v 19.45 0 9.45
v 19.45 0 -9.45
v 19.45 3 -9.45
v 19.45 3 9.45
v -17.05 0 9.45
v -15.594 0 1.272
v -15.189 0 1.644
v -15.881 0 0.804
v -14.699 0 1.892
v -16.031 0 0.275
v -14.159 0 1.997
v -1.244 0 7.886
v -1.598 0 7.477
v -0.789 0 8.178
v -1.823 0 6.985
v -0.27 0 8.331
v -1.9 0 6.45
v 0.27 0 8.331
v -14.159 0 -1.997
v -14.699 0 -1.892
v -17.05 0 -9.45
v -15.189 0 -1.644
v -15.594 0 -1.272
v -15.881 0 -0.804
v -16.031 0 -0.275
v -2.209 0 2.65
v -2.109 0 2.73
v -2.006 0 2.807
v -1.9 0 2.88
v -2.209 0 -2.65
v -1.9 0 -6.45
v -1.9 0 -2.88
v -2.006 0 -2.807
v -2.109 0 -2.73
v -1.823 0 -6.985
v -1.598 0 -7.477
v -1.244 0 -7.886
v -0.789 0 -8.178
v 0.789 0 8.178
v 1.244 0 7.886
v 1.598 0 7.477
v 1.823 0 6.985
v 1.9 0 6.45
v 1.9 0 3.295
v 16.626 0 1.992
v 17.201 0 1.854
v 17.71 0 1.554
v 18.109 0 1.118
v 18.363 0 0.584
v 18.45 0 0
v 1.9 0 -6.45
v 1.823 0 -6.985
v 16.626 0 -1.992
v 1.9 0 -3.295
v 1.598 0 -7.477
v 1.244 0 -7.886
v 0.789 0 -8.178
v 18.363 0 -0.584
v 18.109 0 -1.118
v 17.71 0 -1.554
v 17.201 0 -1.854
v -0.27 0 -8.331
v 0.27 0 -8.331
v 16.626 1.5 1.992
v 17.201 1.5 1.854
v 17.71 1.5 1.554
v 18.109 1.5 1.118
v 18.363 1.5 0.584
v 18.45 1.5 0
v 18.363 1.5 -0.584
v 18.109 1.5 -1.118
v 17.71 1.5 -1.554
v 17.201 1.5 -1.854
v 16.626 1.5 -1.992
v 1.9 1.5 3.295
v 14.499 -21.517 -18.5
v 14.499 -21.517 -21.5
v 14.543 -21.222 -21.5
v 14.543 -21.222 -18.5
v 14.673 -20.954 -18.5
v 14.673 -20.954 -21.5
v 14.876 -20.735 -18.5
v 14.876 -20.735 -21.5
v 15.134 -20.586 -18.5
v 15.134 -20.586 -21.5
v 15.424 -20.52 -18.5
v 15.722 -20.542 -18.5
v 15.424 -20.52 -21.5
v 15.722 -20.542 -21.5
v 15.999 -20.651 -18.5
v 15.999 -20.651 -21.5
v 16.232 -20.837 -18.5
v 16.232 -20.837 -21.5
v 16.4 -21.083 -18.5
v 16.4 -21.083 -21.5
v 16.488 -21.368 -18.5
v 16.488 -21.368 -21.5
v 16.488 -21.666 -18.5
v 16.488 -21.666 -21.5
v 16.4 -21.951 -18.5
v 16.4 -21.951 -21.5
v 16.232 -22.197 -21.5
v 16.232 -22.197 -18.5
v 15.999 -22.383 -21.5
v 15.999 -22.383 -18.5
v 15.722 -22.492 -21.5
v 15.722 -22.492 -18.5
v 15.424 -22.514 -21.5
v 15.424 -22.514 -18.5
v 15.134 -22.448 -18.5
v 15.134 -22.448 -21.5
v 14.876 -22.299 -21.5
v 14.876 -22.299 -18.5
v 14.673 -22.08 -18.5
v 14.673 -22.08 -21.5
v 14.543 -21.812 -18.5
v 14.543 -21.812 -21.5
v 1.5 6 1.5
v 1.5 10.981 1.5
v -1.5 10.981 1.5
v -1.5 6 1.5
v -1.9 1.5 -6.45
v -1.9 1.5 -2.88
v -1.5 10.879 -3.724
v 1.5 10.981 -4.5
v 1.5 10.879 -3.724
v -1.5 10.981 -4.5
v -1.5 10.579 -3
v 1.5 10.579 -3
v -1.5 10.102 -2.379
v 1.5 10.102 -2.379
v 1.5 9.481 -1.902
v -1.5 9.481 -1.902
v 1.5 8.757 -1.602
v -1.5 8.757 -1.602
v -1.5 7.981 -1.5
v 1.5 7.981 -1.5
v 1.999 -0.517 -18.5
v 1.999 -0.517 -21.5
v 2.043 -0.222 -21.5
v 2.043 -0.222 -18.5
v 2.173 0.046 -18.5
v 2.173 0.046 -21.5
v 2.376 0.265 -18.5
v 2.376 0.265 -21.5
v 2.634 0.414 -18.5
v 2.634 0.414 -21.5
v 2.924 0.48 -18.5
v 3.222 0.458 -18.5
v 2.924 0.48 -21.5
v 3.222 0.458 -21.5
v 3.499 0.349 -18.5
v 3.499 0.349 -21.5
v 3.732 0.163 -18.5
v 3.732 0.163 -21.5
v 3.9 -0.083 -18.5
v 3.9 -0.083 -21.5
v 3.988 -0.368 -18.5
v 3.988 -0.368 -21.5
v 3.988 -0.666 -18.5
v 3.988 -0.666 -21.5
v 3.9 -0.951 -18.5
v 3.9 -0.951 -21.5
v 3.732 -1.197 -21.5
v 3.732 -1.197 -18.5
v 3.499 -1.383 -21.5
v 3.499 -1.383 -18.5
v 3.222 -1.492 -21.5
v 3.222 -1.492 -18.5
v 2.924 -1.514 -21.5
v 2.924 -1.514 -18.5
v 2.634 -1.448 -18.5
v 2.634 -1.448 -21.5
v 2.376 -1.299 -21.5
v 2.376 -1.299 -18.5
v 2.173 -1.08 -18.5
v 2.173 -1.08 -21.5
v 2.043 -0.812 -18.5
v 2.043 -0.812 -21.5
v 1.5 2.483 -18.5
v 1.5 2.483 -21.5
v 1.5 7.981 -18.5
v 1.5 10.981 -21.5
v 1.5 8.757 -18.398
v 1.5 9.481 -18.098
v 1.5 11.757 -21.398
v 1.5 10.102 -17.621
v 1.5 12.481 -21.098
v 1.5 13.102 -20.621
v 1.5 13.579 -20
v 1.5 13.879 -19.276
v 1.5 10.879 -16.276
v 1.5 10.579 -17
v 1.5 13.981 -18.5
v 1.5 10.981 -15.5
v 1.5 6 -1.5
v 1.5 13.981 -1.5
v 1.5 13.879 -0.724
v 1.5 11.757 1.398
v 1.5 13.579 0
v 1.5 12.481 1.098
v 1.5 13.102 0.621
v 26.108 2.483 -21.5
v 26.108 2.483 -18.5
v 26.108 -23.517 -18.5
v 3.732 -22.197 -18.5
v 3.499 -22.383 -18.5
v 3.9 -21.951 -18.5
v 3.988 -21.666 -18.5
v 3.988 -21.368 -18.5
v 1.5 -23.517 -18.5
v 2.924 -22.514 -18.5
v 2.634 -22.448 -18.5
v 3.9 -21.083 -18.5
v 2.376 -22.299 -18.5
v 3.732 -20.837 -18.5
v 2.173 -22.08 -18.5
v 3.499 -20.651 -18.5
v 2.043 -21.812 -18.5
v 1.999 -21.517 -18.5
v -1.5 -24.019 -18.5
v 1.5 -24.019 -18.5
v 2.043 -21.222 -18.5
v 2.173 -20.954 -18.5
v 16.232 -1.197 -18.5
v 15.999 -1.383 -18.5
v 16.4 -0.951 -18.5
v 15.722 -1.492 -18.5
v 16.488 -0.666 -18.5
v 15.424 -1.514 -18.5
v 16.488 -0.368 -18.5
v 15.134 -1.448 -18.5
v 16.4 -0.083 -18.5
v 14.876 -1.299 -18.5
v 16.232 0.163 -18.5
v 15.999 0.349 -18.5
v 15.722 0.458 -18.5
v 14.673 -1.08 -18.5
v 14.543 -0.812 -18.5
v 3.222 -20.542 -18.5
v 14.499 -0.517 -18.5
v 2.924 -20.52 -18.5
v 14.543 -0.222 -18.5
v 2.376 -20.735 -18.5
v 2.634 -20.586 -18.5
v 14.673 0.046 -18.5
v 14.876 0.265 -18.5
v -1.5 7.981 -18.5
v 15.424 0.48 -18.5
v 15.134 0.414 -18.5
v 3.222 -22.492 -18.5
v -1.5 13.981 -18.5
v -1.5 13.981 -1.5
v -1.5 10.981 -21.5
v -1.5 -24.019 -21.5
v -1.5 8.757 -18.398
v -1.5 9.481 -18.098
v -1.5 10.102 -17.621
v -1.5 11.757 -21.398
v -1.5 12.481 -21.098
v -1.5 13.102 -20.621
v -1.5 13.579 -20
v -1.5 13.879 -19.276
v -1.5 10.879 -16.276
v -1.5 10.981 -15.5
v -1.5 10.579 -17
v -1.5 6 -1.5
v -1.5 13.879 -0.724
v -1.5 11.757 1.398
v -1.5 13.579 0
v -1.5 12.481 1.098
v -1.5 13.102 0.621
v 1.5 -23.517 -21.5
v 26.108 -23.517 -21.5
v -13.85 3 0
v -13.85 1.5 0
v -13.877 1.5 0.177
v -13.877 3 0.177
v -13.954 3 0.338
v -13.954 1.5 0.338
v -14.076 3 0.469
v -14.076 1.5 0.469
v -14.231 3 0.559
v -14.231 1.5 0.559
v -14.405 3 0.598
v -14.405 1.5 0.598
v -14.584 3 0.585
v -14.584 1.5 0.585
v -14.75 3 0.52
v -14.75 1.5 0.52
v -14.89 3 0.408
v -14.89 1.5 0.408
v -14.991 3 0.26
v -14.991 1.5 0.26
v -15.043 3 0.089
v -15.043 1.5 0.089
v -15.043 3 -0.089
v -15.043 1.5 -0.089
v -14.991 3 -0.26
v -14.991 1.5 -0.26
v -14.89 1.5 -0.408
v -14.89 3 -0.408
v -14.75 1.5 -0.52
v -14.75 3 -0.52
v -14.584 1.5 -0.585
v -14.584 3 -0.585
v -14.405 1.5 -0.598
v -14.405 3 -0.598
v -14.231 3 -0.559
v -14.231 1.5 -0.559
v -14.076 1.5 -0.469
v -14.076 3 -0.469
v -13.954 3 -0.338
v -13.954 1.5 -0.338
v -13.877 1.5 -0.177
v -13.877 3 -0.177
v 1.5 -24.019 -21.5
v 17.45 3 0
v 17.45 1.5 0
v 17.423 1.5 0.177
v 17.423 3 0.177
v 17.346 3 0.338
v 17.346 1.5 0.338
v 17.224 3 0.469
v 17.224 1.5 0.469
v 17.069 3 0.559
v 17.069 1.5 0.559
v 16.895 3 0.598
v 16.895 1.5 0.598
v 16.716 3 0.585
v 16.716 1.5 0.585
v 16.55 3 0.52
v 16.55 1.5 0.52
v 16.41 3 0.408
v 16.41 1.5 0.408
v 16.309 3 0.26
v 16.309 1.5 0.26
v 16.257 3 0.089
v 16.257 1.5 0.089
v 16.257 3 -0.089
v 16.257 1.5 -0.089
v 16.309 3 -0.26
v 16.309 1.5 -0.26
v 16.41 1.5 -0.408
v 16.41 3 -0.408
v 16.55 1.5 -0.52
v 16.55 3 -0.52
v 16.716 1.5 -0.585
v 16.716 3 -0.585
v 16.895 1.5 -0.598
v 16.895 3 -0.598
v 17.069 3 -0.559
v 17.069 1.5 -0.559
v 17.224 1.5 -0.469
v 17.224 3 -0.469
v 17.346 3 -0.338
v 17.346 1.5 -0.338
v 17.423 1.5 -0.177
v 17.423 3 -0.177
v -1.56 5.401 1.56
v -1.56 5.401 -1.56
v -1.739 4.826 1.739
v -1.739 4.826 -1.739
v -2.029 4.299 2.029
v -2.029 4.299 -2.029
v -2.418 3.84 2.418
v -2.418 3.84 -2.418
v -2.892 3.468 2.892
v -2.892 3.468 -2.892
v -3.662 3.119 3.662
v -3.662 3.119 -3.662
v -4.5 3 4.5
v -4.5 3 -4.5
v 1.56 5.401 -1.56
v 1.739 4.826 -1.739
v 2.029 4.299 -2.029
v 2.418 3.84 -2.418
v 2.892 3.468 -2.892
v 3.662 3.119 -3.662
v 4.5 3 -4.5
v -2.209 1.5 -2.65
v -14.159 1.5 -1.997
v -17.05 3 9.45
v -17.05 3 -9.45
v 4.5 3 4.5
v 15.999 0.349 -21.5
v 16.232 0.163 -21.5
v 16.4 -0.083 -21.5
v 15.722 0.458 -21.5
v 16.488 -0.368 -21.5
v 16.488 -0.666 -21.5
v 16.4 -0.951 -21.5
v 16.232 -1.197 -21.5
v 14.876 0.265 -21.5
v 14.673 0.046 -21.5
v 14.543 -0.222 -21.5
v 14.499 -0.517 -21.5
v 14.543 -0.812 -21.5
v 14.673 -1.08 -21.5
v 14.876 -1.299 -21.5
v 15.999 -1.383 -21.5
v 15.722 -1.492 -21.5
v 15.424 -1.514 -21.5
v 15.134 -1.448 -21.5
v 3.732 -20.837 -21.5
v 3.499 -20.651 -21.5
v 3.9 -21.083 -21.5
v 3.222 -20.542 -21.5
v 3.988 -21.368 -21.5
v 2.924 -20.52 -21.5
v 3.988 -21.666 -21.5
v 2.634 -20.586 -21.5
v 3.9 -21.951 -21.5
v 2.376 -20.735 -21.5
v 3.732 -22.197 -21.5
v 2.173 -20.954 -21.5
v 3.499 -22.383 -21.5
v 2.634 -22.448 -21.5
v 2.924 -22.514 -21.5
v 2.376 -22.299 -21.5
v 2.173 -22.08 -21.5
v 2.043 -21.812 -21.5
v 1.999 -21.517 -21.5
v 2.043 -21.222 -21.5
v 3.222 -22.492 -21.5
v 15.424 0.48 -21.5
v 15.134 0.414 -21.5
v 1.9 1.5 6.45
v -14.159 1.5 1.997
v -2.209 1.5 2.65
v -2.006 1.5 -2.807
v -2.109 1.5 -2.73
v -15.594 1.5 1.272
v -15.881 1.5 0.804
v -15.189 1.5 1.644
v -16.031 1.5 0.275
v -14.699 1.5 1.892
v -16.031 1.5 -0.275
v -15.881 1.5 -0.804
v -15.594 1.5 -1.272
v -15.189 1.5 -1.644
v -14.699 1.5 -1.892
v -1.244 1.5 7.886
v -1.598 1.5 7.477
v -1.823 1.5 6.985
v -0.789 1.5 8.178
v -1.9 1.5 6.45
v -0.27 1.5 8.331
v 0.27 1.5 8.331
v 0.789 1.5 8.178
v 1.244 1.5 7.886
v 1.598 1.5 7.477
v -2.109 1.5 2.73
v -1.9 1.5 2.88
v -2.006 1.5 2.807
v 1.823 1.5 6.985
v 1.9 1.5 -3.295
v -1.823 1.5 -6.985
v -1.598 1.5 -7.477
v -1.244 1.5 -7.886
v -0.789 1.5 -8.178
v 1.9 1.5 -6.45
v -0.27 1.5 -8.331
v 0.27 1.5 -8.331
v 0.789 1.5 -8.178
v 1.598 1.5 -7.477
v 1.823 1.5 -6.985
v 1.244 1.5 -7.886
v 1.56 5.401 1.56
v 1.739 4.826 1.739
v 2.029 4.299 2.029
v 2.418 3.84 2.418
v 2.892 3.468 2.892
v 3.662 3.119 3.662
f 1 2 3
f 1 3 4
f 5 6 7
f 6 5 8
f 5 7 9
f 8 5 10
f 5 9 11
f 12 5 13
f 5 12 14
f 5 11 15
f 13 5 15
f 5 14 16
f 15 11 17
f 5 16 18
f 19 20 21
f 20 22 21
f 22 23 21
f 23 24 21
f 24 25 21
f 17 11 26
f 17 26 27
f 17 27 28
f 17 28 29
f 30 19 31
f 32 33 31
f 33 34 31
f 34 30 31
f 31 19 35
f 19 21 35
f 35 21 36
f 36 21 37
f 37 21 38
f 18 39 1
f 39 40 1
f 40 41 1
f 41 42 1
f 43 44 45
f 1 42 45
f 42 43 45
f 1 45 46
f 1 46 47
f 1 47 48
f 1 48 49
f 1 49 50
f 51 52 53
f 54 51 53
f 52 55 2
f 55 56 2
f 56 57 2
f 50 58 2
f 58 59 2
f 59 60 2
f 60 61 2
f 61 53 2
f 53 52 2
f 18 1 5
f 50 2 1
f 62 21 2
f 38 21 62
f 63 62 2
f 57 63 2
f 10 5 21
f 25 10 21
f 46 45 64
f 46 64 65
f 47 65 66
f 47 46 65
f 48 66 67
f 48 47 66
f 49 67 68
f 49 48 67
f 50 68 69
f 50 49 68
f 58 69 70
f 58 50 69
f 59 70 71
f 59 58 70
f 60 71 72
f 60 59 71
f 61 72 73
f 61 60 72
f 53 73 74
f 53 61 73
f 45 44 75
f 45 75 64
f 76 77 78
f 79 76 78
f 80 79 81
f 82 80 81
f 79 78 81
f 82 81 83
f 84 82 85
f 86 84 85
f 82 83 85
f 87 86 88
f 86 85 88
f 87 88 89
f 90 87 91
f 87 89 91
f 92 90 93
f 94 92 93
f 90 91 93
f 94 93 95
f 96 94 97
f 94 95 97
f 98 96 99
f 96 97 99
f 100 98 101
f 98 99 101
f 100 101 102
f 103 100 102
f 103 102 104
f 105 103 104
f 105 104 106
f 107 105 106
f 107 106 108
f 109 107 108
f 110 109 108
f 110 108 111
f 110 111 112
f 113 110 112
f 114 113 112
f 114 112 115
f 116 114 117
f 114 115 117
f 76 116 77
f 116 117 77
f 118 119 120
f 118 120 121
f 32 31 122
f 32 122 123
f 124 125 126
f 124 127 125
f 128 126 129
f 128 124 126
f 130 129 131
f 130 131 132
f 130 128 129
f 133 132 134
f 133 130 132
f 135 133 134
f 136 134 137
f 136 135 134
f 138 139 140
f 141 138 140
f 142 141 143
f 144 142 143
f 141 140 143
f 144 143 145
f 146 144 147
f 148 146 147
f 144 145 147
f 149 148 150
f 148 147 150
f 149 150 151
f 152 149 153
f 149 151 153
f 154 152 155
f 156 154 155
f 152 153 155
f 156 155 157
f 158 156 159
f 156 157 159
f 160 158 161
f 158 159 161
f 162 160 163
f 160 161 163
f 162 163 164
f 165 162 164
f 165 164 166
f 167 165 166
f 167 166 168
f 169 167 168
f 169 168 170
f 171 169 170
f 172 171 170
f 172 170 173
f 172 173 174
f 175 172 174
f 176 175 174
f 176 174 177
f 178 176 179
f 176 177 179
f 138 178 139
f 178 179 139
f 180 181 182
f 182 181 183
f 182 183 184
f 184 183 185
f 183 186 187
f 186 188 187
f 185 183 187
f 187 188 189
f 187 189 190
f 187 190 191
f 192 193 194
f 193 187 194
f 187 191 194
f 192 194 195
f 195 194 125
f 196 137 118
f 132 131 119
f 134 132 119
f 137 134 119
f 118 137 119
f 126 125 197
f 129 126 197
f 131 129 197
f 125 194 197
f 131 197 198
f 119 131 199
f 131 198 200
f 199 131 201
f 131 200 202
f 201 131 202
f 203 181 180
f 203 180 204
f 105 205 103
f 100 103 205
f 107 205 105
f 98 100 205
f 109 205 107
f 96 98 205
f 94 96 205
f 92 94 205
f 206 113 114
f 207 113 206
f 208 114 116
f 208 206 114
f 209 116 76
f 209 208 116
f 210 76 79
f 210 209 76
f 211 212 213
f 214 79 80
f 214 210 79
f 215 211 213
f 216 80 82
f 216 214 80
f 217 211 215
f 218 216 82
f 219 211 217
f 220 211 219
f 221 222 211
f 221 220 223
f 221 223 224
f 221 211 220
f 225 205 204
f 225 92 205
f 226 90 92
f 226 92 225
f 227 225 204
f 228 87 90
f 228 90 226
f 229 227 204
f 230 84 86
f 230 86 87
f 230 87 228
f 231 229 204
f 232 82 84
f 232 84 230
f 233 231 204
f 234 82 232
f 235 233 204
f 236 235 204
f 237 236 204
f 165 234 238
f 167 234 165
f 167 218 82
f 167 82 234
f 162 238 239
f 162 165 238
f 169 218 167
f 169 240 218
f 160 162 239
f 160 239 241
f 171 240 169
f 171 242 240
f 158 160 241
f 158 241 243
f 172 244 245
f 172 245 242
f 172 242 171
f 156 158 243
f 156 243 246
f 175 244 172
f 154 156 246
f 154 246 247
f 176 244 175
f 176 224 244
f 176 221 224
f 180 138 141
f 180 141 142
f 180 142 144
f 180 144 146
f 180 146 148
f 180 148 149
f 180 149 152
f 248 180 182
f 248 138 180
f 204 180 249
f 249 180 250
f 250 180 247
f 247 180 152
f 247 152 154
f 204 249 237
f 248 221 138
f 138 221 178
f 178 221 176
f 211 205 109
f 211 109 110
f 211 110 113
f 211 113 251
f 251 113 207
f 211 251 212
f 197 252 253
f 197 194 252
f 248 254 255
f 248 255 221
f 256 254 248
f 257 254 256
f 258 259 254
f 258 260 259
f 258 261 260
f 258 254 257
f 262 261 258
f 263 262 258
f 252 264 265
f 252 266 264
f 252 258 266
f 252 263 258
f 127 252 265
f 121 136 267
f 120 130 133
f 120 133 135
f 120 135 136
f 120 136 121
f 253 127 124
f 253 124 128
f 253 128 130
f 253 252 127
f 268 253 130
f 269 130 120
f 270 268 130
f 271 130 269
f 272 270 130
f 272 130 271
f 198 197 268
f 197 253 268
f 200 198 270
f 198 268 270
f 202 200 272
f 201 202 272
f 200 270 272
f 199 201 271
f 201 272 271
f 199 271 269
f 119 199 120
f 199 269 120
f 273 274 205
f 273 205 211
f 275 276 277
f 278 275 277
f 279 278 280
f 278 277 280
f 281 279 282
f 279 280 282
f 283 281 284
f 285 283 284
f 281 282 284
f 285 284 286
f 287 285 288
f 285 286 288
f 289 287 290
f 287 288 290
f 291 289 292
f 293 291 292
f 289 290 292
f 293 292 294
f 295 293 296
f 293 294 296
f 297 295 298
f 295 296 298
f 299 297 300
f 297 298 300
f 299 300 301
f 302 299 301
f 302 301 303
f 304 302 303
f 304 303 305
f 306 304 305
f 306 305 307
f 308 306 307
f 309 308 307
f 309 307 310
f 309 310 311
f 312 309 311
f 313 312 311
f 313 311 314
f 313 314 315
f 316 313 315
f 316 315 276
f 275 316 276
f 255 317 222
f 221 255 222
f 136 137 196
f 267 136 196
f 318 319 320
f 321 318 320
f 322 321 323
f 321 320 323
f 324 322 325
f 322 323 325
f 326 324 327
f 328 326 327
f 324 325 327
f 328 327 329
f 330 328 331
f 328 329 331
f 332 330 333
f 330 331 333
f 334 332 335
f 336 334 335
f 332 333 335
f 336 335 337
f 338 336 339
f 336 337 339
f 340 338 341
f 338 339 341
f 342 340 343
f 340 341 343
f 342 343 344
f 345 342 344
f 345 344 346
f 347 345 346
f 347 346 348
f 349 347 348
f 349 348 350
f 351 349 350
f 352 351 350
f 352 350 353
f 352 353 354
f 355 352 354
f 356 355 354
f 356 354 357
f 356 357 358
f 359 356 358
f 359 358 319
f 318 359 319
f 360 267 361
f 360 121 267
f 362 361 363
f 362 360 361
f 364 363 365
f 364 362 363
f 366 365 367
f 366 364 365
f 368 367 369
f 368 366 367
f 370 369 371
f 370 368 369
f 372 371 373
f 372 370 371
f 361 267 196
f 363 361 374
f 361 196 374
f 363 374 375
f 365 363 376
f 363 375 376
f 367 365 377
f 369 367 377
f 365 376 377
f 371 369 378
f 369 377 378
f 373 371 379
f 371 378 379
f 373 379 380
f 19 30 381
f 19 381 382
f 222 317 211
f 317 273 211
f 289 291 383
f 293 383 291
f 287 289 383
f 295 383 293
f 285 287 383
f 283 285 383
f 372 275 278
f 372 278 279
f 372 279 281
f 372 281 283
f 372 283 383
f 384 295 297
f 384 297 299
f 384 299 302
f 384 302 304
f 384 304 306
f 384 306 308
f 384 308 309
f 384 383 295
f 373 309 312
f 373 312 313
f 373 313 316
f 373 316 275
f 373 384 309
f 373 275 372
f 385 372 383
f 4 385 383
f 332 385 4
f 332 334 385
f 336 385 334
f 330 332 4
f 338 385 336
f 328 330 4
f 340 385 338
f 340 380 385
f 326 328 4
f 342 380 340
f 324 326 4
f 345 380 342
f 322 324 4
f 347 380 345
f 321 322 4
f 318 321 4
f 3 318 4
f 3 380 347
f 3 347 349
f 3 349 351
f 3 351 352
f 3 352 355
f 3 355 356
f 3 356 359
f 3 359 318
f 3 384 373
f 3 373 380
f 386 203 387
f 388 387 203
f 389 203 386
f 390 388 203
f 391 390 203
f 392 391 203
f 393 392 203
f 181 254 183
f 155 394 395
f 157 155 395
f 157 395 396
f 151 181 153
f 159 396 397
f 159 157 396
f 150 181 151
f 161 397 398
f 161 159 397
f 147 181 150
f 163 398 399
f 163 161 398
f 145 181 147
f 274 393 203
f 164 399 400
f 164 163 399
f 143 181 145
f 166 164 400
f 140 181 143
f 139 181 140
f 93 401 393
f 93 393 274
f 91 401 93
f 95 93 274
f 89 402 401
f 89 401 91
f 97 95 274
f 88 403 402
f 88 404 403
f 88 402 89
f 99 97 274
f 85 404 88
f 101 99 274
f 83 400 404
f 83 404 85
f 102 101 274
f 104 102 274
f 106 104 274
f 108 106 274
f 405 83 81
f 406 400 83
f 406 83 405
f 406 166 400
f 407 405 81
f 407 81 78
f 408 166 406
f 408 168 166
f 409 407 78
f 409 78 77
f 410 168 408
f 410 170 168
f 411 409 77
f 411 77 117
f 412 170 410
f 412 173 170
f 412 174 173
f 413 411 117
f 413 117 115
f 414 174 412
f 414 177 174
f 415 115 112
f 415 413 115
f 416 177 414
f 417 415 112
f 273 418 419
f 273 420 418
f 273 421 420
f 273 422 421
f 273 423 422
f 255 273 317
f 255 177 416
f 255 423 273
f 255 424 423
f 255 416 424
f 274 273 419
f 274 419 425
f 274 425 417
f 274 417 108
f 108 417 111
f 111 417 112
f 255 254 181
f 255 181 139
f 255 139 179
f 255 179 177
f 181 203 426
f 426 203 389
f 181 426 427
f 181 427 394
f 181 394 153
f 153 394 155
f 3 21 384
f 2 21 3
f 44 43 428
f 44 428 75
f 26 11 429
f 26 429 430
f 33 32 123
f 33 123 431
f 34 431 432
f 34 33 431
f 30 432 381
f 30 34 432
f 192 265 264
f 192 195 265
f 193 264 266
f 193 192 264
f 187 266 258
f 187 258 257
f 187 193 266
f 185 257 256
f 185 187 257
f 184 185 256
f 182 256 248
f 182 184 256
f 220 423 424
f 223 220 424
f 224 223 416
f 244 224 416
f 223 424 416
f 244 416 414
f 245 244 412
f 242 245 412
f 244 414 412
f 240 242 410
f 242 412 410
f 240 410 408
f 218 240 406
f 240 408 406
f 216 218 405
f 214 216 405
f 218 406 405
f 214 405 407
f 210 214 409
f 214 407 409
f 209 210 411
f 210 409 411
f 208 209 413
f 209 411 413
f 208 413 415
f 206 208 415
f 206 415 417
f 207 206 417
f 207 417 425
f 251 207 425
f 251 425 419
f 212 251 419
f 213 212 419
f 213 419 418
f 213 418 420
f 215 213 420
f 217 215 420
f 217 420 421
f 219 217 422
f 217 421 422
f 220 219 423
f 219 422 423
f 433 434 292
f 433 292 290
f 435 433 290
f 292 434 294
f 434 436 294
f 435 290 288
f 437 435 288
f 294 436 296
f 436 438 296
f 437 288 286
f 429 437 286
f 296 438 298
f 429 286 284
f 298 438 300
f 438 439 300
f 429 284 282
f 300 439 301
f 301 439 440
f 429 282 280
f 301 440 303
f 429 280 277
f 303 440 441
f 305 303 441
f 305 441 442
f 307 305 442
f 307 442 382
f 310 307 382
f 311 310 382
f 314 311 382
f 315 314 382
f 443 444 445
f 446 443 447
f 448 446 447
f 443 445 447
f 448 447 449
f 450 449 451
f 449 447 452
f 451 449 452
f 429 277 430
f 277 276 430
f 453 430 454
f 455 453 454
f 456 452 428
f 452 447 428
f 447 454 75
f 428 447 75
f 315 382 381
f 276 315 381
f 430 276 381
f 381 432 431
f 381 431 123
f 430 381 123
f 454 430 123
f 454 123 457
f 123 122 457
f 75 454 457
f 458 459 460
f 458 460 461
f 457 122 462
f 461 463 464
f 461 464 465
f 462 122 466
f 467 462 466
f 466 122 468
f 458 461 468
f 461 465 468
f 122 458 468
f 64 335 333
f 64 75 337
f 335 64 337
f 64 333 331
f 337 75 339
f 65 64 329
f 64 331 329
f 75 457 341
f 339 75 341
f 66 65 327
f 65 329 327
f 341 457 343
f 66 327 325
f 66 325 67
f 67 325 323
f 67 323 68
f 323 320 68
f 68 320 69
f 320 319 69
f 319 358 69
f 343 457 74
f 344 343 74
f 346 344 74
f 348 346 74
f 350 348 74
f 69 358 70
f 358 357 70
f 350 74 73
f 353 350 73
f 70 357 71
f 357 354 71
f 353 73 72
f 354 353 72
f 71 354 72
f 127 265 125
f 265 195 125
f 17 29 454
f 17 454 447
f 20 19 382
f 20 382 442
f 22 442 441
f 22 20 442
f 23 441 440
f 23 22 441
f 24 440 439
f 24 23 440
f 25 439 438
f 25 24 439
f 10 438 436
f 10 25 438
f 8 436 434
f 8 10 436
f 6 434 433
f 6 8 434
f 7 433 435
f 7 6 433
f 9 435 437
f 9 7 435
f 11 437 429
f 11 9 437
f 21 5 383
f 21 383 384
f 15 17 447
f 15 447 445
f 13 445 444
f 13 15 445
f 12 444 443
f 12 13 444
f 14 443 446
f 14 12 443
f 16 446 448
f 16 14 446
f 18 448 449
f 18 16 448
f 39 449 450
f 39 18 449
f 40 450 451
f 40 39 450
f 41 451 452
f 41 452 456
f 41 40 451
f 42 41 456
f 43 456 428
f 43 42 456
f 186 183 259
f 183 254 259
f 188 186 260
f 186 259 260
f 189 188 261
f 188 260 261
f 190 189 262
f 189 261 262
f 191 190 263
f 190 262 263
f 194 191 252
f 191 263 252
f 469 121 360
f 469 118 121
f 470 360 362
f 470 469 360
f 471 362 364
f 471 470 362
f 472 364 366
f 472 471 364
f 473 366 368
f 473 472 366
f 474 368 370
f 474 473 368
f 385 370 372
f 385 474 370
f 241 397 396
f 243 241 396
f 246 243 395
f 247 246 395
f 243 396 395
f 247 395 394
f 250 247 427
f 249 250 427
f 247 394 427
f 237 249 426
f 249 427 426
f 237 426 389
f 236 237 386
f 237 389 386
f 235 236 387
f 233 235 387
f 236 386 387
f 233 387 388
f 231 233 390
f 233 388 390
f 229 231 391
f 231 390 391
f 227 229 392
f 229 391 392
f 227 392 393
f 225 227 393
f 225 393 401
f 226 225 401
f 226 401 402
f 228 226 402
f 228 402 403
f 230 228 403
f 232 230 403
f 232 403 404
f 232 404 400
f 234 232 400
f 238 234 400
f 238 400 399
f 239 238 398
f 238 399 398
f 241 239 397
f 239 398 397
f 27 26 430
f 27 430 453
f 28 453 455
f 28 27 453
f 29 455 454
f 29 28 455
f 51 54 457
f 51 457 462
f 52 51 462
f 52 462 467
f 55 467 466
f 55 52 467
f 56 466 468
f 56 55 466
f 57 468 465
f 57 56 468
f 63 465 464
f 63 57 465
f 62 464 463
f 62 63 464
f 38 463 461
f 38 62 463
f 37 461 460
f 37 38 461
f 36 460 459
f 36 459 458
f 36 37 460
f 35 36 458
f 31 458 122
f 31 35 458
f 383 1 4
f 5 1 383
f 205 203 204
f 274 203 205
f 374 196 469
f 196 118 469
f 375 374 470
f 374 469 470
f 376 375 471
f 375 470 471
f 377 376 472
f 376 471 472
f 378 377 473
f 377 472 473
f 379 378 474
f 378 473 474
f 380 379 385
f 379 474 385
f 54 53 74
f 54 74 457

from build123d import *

# Parameters (mm, degrees)
IZIM1_W                                 = 40.658634346
IZIM1_H                                 = 22.072921898
Y_KSEKLIK_EKSTR_ZYON3_DEPTH             = 1.5
IZIM10_W                                = 40.658634346
IZIM10_H                                = 22.072921898
Y_KSEKLIK_EKSTR_ZYON5_DEPTH             = 1.5
Y_KSEKLIK_EKSTR_ZYON6_DEPTH             = 1.5
IZIM12_W                                = 40.658634346
IZIM12_H                                = 22.072921898
KES_EKSTR_ZYON1_DEPTH                   = 5
KES_EKSTR_ZYON1_DEPTH_BACK              = 3
RADYUS1_R                               = 3
Y_KSEKLIK_EKSTR_ZYON7_REACH             = 3.5
Y_KSEKLIK_EKSTR_ZYON7_DIRECTION_2_REACH = 31.45
IZIM18_R                                = 0.6
KES_EKSTR_ZYON3_DEPTH                   = 7
KES_EKSTR_ZYON3_DEPTH_BACK              = 3
SKETCH1_R                               = 1
CUT_EXTRUDE1_DEPTH                      = 3


with BuildPart() as part:
    # Çizim1 → Yükseklik-Ekstrüzyon3 (new body)
    with BuildSketch(Plane(origin=(0, 0, 0), x_dir=(1, 0, 0), z_dir=(0, 1, 0))):
        with Locations((1.2, 0)):
            Rectangle(IZIM1_W, IZIM1_H)
        with BuildLine():
            Line((1.9, -6.45), (1.9, -3.295349698))
            Line((1.9, -3.295349698), (16.626291793, -1.99221515))
            ThreePointArc((16.626291793, -1.99221515), (18.45, 0), (16.626291793, 1.99221515))
            Line((16.626291793, 1.99221515), (1.9, 3.295349698))
            Line((1.9, 3.295349698), (1.9, 6.45))
            ThreePointArc((1.9, 6.45), (0, 8.35), (-1.9, 6.45))
            Line((-1.9, 6.45), (-1.9, 2.87967012))
            ThreePointArc((-1.9, 2.87967012), (-2.057742862, 2.769150468), (-2.209072203, 2.65))
            Line((-2.209072203, 2.65), (-14.159121967, 1.99702088))
            ThreePointArc((-14.159121967, 1.99702088), (-16.05, 0), (-14.159121967, -1.99702088))
            Line((-14.159121967, -1.99702088), (-2.209072203, -2.65))
            ThreePointArc((-2.209072203, -2.65), (-2.057742862, -2.769150468), (-1.9, -2.87967012))
            Line((-1.9, -2.87967012), (-1.9, -6.45))
            ThreePointArc((-1.9, -6.45), (0, -8.35), (1.9, -6.45))
        make_face(mode=Mode.SUBTRACT)
    extrude(amount=Y_KSEKLIK_EKSTR_ZYON3_DEPTH)

    # Çizim10 → Yükseklik-Ekstrüzyon5 (add)
    with BuildSketch(Plane(origin=(0, 1.5, 0), x_dir=(1, 0, 0), z_dir=(0, 1, 0))):
        with Locations((1.2, 0)):
            Rectangle(IZIM10_W, IZIM10_H)
    extrude(amount=Y_KSEKLIK_EKSTR_ZYON5_DEPTH)

    # Çizim11 → Yükseklik-Ekstrüzyon6 (add, symmetric)
    with BuildSketch(Plane(origin=(0, 0, 0), x_dir=(0, 0, -1), z_dir=(1, 0, 0))):
        Polygon((18.5, 10.980931434), (1.5, 10.980931434), (1.5, 1.777726909), (-1.5, 1.777726909), (-1.5, 10.980931434), (-1.5, 13.980931434), (1.5, 13.980931434), (21.5, 13.980931434), (21.5, -24.019068566), (18.5, -24.019068566), align=None)
    extrude(amount=Y_KSEKLIK_EKSTR_ZYON6_DEPTH, both=True)

    # Çizim12 → Kes-Ekstrüzyon1 (cut, two sides)
    with BuildSketch(Plane(origin=(0, 0, 0), x_dir=(1, 0, 0), z_dir=(0, 1, 0))) as kes_ekstr_zyon1_sk:
        with Locations((1.2, 0)):
            Rectangle(IZIM12_W, IZIM12_H)
        Polygon((0, -9.45), (-17.05, -9.45), (-17.05, 9.45), (19.45, 9.45), (19.45, -9.45), align=None, mode=Mode.SUBTRACT)
    extrude(amount=KES_EKSTR_ZYON1_DEPTH, mode=Mode.SUBTRACT)
    extrude(kes_ekstr_zyon1_sk.sketch, amount=-KES_EKSTR_ZYON1_DEPTH_BACK, mode=Mode.SUBTRACT)

    # Radyus1
    radyus1_edges = [part.edges().sort_by_distance(p)[0] for p in [
        (-1.5, 3, 0),
        (0, 3, -1.5),
        (0, 3, 1.5),
        (1.5, 3, 0),
        (0, 13.980931434, -21.5),
        (0, 13.980931434, 1.5),
        (0, 10.980931434, -1.5),
        (0, 10.980931434, -18.5),
    ]]
    fillet(radyus1_edges, radius=RADYUS1_R)

    # Yükseklik-Ekstrüzyon7: up to this face of the body (flat: up to its plane)
    y_kseklik_ekstr_zyon7_end = Plane(part.part.faces().sort_by_distance((0, -6.519068566, -21.5))[0])
    # Çizim13 → Yükseklik-Ekstrüzyon7 (add, up to the picked face)
    with BuildSketch(Plane(origin=(0, 0, -20), x_dir=(-1, 0, 0), z_dir=(0, 0, -1)), mode=Mode.PRIVATE) as y_kseklik_ekstr_zyon7_sk1:
        Polygon((-26.108304445, 2.483027661), (-26.108304445, -23.516972339), (0.891695555, -23.516972339), (0.891695555, -2.497903773), (0.891695555, 2.483027661), align=None)
    y_kseklik_ekstr_zyon7_tool1 = split(extrude(y_kseklik_ekstr_zyon7_sk1.sketch, amount=Y_KSEKLIK_EKSTR_ZYON7_REACH, mode=Mode.PRIVATE), bisect_by=y_kseklik_ekstr_zyon7_end, keep=Keep.BOTH, mode=Mode.PRIVATE)
    add(y_kseklik_ekstr_zyon7_tool1.solids().sort_by_distance((12.608304, -10.516972, -20))[0])

    # Yükseklik-Ekstrüzyon7 direction 2: up to this face of the body (flat: up to its plane)
    y_kseklik_ekstr_zyon7_direction_2_end = Plane(part.part.faces().sort_by_distance((0, -8.019068566, -18.5))[0])
    # Çizim13 → Yükseklik-Ekstrüzyon7 direction 2 (add, up to the picked face)
    with BuildSketch(Plane(origin=(0, 0, -20), x_dir=(-1, 0, 0), z_dir=(0, 0, -1)), mode=Mode.PRIVATE) as y_kseklik_ekstr_zyon7_direction_2_sk1:
        Polygon((-26.108304445, 2.483027661), (-26.108304445, -23.516972339), (0.891695555, -23.516972339), (0.891695555, -2.497903773), (0.891695555, 2.483027661), align=None)
    y_kseklik_ekstr_zyon7_direction_2_tool1 = split(extrude(y_kseklik_ekstr_zyon7_direction_2_sk1.sketch, amount=-Y_KSEKLIK_EKSTR_ZYON7_DIRECTION_2_REACH, mode=Mode.PRIVATE), bisect_by=y_kseklik_ekstr_zyon7_direction_2_end, keep=Keep.BOTH, mode=Mode.PRIVATE)
    add(y_kseklik_ekstr_zyon7_direction_2_tool1.solids().sort_by_distance((12.608304, -10.516972, -20))[0])

    # Çizim18 → Kes-Ekstrüzyon3 (cut, two sides)
    with BuildSketch(Plane.XZ.offset(-1.5)) as kes_ekstr_zyon3_sk:
        with Locations((-14.45, 0)):
            Circle(IZIM18_R)
        with Locations((16.85, 0)):
            Circle(IZIM18_R)
    extrude(amount=KES_EKSTR_ZYON3_DEPTH, mode=Mode.SUBTRACT)
    extrude(kes_ekstr_zyon3_sk.sketch, amount=-KES_EKSTR_ZYON3_DEPTH_BACK, mode=Mode.SUBTRACT)

    # Sketch1 → Cut-Extrude1 (cut)
    with BuildSketch(Plane(origin=(0, 0, -21.5), x_dir=(-1, 0, 0), z_dir=(0, 0, -1))):
        with Locations((-2.999001891, -0.516972339)):
            Circle(SKETCH1_R)
        with Locations((-2.999001891, -21.516972339)):
            Circle(SKETCH1_R)
        with Locations((-15.499001891, -21.516972339)):
            Circle(SKETCH1_R)
        with Locations((-15.499001891, -0.516972339)):
            Circle(SKETCH1_R)
    extrude(amount=-CUT_EXTRUDE1_DEPTH, mode=Mode.SUBTRACT)


solid = part.part
